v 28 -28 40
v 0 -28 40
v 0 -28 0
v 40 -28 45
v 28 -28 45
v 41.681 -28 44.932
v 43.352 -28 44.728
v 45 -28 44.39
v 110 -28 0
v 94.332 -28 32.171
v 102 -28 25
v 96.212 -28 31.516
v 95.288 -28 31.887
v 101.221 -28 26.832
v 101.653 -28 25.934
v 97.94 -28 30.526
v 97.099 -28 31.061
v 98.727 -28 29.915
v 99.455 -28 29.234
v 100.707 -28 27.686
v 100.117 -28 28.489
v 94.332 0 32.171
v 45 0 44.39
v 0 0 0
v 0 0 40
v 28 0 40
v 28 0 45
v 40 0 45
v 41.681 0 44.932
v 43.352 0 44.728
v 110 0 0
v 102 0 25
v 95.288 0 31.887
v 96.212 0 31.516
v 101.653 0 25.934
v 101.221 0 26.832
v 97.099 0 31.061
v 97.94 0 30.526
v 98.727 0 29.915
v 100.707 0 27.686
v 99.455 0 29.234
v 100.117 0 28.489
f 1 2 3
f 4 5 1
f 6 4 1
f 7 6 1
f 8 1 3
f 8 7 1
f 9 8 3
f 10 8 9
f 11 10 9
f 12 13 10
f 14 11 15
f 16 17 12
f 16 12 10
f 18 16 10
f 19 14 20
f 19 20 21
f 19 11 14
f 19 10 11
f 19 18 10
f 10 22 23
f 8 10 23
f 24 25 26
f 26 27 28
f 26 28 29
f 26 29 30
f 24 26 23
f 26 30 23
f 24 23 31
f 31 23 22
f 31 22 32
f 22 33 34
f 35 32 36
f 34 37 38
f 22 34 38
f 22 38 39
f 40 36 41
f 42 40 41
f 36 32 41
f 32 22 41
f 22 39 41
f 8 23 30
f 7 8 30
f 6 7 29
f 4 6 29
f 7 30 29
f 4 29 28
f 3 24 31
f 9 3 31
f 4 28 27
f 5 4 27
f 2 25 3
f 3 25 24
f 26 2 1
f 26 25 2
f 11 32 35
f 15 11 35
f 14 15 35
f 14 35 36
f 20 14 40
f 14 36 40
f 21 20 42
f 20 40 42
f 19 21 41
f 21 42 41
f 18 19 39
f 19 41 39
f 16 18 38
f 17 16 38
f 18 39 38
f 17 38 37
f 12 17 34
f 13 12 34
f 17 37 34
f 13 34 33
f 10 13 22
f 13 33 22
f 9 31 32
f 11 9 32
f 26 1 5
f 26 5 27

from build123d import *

# Parameters (mm, degrees)
BOX_W     = 30
BOX_H     = 37
BOX_DEPTH = 13
PAD_DEPTH = 28


with BuildPart() as cube:
    # Box → Box (new body)
    with BuildSketch(Plane(origin=(-2, -32, 40), x_dir=(1, 0, 0), z_dir=(0, 0, 1))):
        with Locations((15, 18.5)):
            Rectangle(BOX_W, BOX_H)
    extrude(amount=BOX_DEPTH)


with BuildPart() as cut:
    # Sketch → Pad (new body)
    with BuildSketch(Plane.XZ):
        with BuildLine():
            Line((0, 0), (110, 0))
            Line((110, 0), (102, 25))
            ThreePointArc((102, 25), (99.099229, 29.583137), (94.332421, 32.171022))
            Line((94.332421, 32.171022), (45, 44.39))
            ThreePointArc((45, 44.39), (42.518536, 44.846937), (40, 45))
            Line((40, 45), (0, 45))
            Line((0, 45), (0, 0))
        make_face()
    extrude(amount=PAD_DEPTH)

    # Cut: cut Cube
    add(cube.part, mode=Mode.SUBTRACT)


solid = cut.part
